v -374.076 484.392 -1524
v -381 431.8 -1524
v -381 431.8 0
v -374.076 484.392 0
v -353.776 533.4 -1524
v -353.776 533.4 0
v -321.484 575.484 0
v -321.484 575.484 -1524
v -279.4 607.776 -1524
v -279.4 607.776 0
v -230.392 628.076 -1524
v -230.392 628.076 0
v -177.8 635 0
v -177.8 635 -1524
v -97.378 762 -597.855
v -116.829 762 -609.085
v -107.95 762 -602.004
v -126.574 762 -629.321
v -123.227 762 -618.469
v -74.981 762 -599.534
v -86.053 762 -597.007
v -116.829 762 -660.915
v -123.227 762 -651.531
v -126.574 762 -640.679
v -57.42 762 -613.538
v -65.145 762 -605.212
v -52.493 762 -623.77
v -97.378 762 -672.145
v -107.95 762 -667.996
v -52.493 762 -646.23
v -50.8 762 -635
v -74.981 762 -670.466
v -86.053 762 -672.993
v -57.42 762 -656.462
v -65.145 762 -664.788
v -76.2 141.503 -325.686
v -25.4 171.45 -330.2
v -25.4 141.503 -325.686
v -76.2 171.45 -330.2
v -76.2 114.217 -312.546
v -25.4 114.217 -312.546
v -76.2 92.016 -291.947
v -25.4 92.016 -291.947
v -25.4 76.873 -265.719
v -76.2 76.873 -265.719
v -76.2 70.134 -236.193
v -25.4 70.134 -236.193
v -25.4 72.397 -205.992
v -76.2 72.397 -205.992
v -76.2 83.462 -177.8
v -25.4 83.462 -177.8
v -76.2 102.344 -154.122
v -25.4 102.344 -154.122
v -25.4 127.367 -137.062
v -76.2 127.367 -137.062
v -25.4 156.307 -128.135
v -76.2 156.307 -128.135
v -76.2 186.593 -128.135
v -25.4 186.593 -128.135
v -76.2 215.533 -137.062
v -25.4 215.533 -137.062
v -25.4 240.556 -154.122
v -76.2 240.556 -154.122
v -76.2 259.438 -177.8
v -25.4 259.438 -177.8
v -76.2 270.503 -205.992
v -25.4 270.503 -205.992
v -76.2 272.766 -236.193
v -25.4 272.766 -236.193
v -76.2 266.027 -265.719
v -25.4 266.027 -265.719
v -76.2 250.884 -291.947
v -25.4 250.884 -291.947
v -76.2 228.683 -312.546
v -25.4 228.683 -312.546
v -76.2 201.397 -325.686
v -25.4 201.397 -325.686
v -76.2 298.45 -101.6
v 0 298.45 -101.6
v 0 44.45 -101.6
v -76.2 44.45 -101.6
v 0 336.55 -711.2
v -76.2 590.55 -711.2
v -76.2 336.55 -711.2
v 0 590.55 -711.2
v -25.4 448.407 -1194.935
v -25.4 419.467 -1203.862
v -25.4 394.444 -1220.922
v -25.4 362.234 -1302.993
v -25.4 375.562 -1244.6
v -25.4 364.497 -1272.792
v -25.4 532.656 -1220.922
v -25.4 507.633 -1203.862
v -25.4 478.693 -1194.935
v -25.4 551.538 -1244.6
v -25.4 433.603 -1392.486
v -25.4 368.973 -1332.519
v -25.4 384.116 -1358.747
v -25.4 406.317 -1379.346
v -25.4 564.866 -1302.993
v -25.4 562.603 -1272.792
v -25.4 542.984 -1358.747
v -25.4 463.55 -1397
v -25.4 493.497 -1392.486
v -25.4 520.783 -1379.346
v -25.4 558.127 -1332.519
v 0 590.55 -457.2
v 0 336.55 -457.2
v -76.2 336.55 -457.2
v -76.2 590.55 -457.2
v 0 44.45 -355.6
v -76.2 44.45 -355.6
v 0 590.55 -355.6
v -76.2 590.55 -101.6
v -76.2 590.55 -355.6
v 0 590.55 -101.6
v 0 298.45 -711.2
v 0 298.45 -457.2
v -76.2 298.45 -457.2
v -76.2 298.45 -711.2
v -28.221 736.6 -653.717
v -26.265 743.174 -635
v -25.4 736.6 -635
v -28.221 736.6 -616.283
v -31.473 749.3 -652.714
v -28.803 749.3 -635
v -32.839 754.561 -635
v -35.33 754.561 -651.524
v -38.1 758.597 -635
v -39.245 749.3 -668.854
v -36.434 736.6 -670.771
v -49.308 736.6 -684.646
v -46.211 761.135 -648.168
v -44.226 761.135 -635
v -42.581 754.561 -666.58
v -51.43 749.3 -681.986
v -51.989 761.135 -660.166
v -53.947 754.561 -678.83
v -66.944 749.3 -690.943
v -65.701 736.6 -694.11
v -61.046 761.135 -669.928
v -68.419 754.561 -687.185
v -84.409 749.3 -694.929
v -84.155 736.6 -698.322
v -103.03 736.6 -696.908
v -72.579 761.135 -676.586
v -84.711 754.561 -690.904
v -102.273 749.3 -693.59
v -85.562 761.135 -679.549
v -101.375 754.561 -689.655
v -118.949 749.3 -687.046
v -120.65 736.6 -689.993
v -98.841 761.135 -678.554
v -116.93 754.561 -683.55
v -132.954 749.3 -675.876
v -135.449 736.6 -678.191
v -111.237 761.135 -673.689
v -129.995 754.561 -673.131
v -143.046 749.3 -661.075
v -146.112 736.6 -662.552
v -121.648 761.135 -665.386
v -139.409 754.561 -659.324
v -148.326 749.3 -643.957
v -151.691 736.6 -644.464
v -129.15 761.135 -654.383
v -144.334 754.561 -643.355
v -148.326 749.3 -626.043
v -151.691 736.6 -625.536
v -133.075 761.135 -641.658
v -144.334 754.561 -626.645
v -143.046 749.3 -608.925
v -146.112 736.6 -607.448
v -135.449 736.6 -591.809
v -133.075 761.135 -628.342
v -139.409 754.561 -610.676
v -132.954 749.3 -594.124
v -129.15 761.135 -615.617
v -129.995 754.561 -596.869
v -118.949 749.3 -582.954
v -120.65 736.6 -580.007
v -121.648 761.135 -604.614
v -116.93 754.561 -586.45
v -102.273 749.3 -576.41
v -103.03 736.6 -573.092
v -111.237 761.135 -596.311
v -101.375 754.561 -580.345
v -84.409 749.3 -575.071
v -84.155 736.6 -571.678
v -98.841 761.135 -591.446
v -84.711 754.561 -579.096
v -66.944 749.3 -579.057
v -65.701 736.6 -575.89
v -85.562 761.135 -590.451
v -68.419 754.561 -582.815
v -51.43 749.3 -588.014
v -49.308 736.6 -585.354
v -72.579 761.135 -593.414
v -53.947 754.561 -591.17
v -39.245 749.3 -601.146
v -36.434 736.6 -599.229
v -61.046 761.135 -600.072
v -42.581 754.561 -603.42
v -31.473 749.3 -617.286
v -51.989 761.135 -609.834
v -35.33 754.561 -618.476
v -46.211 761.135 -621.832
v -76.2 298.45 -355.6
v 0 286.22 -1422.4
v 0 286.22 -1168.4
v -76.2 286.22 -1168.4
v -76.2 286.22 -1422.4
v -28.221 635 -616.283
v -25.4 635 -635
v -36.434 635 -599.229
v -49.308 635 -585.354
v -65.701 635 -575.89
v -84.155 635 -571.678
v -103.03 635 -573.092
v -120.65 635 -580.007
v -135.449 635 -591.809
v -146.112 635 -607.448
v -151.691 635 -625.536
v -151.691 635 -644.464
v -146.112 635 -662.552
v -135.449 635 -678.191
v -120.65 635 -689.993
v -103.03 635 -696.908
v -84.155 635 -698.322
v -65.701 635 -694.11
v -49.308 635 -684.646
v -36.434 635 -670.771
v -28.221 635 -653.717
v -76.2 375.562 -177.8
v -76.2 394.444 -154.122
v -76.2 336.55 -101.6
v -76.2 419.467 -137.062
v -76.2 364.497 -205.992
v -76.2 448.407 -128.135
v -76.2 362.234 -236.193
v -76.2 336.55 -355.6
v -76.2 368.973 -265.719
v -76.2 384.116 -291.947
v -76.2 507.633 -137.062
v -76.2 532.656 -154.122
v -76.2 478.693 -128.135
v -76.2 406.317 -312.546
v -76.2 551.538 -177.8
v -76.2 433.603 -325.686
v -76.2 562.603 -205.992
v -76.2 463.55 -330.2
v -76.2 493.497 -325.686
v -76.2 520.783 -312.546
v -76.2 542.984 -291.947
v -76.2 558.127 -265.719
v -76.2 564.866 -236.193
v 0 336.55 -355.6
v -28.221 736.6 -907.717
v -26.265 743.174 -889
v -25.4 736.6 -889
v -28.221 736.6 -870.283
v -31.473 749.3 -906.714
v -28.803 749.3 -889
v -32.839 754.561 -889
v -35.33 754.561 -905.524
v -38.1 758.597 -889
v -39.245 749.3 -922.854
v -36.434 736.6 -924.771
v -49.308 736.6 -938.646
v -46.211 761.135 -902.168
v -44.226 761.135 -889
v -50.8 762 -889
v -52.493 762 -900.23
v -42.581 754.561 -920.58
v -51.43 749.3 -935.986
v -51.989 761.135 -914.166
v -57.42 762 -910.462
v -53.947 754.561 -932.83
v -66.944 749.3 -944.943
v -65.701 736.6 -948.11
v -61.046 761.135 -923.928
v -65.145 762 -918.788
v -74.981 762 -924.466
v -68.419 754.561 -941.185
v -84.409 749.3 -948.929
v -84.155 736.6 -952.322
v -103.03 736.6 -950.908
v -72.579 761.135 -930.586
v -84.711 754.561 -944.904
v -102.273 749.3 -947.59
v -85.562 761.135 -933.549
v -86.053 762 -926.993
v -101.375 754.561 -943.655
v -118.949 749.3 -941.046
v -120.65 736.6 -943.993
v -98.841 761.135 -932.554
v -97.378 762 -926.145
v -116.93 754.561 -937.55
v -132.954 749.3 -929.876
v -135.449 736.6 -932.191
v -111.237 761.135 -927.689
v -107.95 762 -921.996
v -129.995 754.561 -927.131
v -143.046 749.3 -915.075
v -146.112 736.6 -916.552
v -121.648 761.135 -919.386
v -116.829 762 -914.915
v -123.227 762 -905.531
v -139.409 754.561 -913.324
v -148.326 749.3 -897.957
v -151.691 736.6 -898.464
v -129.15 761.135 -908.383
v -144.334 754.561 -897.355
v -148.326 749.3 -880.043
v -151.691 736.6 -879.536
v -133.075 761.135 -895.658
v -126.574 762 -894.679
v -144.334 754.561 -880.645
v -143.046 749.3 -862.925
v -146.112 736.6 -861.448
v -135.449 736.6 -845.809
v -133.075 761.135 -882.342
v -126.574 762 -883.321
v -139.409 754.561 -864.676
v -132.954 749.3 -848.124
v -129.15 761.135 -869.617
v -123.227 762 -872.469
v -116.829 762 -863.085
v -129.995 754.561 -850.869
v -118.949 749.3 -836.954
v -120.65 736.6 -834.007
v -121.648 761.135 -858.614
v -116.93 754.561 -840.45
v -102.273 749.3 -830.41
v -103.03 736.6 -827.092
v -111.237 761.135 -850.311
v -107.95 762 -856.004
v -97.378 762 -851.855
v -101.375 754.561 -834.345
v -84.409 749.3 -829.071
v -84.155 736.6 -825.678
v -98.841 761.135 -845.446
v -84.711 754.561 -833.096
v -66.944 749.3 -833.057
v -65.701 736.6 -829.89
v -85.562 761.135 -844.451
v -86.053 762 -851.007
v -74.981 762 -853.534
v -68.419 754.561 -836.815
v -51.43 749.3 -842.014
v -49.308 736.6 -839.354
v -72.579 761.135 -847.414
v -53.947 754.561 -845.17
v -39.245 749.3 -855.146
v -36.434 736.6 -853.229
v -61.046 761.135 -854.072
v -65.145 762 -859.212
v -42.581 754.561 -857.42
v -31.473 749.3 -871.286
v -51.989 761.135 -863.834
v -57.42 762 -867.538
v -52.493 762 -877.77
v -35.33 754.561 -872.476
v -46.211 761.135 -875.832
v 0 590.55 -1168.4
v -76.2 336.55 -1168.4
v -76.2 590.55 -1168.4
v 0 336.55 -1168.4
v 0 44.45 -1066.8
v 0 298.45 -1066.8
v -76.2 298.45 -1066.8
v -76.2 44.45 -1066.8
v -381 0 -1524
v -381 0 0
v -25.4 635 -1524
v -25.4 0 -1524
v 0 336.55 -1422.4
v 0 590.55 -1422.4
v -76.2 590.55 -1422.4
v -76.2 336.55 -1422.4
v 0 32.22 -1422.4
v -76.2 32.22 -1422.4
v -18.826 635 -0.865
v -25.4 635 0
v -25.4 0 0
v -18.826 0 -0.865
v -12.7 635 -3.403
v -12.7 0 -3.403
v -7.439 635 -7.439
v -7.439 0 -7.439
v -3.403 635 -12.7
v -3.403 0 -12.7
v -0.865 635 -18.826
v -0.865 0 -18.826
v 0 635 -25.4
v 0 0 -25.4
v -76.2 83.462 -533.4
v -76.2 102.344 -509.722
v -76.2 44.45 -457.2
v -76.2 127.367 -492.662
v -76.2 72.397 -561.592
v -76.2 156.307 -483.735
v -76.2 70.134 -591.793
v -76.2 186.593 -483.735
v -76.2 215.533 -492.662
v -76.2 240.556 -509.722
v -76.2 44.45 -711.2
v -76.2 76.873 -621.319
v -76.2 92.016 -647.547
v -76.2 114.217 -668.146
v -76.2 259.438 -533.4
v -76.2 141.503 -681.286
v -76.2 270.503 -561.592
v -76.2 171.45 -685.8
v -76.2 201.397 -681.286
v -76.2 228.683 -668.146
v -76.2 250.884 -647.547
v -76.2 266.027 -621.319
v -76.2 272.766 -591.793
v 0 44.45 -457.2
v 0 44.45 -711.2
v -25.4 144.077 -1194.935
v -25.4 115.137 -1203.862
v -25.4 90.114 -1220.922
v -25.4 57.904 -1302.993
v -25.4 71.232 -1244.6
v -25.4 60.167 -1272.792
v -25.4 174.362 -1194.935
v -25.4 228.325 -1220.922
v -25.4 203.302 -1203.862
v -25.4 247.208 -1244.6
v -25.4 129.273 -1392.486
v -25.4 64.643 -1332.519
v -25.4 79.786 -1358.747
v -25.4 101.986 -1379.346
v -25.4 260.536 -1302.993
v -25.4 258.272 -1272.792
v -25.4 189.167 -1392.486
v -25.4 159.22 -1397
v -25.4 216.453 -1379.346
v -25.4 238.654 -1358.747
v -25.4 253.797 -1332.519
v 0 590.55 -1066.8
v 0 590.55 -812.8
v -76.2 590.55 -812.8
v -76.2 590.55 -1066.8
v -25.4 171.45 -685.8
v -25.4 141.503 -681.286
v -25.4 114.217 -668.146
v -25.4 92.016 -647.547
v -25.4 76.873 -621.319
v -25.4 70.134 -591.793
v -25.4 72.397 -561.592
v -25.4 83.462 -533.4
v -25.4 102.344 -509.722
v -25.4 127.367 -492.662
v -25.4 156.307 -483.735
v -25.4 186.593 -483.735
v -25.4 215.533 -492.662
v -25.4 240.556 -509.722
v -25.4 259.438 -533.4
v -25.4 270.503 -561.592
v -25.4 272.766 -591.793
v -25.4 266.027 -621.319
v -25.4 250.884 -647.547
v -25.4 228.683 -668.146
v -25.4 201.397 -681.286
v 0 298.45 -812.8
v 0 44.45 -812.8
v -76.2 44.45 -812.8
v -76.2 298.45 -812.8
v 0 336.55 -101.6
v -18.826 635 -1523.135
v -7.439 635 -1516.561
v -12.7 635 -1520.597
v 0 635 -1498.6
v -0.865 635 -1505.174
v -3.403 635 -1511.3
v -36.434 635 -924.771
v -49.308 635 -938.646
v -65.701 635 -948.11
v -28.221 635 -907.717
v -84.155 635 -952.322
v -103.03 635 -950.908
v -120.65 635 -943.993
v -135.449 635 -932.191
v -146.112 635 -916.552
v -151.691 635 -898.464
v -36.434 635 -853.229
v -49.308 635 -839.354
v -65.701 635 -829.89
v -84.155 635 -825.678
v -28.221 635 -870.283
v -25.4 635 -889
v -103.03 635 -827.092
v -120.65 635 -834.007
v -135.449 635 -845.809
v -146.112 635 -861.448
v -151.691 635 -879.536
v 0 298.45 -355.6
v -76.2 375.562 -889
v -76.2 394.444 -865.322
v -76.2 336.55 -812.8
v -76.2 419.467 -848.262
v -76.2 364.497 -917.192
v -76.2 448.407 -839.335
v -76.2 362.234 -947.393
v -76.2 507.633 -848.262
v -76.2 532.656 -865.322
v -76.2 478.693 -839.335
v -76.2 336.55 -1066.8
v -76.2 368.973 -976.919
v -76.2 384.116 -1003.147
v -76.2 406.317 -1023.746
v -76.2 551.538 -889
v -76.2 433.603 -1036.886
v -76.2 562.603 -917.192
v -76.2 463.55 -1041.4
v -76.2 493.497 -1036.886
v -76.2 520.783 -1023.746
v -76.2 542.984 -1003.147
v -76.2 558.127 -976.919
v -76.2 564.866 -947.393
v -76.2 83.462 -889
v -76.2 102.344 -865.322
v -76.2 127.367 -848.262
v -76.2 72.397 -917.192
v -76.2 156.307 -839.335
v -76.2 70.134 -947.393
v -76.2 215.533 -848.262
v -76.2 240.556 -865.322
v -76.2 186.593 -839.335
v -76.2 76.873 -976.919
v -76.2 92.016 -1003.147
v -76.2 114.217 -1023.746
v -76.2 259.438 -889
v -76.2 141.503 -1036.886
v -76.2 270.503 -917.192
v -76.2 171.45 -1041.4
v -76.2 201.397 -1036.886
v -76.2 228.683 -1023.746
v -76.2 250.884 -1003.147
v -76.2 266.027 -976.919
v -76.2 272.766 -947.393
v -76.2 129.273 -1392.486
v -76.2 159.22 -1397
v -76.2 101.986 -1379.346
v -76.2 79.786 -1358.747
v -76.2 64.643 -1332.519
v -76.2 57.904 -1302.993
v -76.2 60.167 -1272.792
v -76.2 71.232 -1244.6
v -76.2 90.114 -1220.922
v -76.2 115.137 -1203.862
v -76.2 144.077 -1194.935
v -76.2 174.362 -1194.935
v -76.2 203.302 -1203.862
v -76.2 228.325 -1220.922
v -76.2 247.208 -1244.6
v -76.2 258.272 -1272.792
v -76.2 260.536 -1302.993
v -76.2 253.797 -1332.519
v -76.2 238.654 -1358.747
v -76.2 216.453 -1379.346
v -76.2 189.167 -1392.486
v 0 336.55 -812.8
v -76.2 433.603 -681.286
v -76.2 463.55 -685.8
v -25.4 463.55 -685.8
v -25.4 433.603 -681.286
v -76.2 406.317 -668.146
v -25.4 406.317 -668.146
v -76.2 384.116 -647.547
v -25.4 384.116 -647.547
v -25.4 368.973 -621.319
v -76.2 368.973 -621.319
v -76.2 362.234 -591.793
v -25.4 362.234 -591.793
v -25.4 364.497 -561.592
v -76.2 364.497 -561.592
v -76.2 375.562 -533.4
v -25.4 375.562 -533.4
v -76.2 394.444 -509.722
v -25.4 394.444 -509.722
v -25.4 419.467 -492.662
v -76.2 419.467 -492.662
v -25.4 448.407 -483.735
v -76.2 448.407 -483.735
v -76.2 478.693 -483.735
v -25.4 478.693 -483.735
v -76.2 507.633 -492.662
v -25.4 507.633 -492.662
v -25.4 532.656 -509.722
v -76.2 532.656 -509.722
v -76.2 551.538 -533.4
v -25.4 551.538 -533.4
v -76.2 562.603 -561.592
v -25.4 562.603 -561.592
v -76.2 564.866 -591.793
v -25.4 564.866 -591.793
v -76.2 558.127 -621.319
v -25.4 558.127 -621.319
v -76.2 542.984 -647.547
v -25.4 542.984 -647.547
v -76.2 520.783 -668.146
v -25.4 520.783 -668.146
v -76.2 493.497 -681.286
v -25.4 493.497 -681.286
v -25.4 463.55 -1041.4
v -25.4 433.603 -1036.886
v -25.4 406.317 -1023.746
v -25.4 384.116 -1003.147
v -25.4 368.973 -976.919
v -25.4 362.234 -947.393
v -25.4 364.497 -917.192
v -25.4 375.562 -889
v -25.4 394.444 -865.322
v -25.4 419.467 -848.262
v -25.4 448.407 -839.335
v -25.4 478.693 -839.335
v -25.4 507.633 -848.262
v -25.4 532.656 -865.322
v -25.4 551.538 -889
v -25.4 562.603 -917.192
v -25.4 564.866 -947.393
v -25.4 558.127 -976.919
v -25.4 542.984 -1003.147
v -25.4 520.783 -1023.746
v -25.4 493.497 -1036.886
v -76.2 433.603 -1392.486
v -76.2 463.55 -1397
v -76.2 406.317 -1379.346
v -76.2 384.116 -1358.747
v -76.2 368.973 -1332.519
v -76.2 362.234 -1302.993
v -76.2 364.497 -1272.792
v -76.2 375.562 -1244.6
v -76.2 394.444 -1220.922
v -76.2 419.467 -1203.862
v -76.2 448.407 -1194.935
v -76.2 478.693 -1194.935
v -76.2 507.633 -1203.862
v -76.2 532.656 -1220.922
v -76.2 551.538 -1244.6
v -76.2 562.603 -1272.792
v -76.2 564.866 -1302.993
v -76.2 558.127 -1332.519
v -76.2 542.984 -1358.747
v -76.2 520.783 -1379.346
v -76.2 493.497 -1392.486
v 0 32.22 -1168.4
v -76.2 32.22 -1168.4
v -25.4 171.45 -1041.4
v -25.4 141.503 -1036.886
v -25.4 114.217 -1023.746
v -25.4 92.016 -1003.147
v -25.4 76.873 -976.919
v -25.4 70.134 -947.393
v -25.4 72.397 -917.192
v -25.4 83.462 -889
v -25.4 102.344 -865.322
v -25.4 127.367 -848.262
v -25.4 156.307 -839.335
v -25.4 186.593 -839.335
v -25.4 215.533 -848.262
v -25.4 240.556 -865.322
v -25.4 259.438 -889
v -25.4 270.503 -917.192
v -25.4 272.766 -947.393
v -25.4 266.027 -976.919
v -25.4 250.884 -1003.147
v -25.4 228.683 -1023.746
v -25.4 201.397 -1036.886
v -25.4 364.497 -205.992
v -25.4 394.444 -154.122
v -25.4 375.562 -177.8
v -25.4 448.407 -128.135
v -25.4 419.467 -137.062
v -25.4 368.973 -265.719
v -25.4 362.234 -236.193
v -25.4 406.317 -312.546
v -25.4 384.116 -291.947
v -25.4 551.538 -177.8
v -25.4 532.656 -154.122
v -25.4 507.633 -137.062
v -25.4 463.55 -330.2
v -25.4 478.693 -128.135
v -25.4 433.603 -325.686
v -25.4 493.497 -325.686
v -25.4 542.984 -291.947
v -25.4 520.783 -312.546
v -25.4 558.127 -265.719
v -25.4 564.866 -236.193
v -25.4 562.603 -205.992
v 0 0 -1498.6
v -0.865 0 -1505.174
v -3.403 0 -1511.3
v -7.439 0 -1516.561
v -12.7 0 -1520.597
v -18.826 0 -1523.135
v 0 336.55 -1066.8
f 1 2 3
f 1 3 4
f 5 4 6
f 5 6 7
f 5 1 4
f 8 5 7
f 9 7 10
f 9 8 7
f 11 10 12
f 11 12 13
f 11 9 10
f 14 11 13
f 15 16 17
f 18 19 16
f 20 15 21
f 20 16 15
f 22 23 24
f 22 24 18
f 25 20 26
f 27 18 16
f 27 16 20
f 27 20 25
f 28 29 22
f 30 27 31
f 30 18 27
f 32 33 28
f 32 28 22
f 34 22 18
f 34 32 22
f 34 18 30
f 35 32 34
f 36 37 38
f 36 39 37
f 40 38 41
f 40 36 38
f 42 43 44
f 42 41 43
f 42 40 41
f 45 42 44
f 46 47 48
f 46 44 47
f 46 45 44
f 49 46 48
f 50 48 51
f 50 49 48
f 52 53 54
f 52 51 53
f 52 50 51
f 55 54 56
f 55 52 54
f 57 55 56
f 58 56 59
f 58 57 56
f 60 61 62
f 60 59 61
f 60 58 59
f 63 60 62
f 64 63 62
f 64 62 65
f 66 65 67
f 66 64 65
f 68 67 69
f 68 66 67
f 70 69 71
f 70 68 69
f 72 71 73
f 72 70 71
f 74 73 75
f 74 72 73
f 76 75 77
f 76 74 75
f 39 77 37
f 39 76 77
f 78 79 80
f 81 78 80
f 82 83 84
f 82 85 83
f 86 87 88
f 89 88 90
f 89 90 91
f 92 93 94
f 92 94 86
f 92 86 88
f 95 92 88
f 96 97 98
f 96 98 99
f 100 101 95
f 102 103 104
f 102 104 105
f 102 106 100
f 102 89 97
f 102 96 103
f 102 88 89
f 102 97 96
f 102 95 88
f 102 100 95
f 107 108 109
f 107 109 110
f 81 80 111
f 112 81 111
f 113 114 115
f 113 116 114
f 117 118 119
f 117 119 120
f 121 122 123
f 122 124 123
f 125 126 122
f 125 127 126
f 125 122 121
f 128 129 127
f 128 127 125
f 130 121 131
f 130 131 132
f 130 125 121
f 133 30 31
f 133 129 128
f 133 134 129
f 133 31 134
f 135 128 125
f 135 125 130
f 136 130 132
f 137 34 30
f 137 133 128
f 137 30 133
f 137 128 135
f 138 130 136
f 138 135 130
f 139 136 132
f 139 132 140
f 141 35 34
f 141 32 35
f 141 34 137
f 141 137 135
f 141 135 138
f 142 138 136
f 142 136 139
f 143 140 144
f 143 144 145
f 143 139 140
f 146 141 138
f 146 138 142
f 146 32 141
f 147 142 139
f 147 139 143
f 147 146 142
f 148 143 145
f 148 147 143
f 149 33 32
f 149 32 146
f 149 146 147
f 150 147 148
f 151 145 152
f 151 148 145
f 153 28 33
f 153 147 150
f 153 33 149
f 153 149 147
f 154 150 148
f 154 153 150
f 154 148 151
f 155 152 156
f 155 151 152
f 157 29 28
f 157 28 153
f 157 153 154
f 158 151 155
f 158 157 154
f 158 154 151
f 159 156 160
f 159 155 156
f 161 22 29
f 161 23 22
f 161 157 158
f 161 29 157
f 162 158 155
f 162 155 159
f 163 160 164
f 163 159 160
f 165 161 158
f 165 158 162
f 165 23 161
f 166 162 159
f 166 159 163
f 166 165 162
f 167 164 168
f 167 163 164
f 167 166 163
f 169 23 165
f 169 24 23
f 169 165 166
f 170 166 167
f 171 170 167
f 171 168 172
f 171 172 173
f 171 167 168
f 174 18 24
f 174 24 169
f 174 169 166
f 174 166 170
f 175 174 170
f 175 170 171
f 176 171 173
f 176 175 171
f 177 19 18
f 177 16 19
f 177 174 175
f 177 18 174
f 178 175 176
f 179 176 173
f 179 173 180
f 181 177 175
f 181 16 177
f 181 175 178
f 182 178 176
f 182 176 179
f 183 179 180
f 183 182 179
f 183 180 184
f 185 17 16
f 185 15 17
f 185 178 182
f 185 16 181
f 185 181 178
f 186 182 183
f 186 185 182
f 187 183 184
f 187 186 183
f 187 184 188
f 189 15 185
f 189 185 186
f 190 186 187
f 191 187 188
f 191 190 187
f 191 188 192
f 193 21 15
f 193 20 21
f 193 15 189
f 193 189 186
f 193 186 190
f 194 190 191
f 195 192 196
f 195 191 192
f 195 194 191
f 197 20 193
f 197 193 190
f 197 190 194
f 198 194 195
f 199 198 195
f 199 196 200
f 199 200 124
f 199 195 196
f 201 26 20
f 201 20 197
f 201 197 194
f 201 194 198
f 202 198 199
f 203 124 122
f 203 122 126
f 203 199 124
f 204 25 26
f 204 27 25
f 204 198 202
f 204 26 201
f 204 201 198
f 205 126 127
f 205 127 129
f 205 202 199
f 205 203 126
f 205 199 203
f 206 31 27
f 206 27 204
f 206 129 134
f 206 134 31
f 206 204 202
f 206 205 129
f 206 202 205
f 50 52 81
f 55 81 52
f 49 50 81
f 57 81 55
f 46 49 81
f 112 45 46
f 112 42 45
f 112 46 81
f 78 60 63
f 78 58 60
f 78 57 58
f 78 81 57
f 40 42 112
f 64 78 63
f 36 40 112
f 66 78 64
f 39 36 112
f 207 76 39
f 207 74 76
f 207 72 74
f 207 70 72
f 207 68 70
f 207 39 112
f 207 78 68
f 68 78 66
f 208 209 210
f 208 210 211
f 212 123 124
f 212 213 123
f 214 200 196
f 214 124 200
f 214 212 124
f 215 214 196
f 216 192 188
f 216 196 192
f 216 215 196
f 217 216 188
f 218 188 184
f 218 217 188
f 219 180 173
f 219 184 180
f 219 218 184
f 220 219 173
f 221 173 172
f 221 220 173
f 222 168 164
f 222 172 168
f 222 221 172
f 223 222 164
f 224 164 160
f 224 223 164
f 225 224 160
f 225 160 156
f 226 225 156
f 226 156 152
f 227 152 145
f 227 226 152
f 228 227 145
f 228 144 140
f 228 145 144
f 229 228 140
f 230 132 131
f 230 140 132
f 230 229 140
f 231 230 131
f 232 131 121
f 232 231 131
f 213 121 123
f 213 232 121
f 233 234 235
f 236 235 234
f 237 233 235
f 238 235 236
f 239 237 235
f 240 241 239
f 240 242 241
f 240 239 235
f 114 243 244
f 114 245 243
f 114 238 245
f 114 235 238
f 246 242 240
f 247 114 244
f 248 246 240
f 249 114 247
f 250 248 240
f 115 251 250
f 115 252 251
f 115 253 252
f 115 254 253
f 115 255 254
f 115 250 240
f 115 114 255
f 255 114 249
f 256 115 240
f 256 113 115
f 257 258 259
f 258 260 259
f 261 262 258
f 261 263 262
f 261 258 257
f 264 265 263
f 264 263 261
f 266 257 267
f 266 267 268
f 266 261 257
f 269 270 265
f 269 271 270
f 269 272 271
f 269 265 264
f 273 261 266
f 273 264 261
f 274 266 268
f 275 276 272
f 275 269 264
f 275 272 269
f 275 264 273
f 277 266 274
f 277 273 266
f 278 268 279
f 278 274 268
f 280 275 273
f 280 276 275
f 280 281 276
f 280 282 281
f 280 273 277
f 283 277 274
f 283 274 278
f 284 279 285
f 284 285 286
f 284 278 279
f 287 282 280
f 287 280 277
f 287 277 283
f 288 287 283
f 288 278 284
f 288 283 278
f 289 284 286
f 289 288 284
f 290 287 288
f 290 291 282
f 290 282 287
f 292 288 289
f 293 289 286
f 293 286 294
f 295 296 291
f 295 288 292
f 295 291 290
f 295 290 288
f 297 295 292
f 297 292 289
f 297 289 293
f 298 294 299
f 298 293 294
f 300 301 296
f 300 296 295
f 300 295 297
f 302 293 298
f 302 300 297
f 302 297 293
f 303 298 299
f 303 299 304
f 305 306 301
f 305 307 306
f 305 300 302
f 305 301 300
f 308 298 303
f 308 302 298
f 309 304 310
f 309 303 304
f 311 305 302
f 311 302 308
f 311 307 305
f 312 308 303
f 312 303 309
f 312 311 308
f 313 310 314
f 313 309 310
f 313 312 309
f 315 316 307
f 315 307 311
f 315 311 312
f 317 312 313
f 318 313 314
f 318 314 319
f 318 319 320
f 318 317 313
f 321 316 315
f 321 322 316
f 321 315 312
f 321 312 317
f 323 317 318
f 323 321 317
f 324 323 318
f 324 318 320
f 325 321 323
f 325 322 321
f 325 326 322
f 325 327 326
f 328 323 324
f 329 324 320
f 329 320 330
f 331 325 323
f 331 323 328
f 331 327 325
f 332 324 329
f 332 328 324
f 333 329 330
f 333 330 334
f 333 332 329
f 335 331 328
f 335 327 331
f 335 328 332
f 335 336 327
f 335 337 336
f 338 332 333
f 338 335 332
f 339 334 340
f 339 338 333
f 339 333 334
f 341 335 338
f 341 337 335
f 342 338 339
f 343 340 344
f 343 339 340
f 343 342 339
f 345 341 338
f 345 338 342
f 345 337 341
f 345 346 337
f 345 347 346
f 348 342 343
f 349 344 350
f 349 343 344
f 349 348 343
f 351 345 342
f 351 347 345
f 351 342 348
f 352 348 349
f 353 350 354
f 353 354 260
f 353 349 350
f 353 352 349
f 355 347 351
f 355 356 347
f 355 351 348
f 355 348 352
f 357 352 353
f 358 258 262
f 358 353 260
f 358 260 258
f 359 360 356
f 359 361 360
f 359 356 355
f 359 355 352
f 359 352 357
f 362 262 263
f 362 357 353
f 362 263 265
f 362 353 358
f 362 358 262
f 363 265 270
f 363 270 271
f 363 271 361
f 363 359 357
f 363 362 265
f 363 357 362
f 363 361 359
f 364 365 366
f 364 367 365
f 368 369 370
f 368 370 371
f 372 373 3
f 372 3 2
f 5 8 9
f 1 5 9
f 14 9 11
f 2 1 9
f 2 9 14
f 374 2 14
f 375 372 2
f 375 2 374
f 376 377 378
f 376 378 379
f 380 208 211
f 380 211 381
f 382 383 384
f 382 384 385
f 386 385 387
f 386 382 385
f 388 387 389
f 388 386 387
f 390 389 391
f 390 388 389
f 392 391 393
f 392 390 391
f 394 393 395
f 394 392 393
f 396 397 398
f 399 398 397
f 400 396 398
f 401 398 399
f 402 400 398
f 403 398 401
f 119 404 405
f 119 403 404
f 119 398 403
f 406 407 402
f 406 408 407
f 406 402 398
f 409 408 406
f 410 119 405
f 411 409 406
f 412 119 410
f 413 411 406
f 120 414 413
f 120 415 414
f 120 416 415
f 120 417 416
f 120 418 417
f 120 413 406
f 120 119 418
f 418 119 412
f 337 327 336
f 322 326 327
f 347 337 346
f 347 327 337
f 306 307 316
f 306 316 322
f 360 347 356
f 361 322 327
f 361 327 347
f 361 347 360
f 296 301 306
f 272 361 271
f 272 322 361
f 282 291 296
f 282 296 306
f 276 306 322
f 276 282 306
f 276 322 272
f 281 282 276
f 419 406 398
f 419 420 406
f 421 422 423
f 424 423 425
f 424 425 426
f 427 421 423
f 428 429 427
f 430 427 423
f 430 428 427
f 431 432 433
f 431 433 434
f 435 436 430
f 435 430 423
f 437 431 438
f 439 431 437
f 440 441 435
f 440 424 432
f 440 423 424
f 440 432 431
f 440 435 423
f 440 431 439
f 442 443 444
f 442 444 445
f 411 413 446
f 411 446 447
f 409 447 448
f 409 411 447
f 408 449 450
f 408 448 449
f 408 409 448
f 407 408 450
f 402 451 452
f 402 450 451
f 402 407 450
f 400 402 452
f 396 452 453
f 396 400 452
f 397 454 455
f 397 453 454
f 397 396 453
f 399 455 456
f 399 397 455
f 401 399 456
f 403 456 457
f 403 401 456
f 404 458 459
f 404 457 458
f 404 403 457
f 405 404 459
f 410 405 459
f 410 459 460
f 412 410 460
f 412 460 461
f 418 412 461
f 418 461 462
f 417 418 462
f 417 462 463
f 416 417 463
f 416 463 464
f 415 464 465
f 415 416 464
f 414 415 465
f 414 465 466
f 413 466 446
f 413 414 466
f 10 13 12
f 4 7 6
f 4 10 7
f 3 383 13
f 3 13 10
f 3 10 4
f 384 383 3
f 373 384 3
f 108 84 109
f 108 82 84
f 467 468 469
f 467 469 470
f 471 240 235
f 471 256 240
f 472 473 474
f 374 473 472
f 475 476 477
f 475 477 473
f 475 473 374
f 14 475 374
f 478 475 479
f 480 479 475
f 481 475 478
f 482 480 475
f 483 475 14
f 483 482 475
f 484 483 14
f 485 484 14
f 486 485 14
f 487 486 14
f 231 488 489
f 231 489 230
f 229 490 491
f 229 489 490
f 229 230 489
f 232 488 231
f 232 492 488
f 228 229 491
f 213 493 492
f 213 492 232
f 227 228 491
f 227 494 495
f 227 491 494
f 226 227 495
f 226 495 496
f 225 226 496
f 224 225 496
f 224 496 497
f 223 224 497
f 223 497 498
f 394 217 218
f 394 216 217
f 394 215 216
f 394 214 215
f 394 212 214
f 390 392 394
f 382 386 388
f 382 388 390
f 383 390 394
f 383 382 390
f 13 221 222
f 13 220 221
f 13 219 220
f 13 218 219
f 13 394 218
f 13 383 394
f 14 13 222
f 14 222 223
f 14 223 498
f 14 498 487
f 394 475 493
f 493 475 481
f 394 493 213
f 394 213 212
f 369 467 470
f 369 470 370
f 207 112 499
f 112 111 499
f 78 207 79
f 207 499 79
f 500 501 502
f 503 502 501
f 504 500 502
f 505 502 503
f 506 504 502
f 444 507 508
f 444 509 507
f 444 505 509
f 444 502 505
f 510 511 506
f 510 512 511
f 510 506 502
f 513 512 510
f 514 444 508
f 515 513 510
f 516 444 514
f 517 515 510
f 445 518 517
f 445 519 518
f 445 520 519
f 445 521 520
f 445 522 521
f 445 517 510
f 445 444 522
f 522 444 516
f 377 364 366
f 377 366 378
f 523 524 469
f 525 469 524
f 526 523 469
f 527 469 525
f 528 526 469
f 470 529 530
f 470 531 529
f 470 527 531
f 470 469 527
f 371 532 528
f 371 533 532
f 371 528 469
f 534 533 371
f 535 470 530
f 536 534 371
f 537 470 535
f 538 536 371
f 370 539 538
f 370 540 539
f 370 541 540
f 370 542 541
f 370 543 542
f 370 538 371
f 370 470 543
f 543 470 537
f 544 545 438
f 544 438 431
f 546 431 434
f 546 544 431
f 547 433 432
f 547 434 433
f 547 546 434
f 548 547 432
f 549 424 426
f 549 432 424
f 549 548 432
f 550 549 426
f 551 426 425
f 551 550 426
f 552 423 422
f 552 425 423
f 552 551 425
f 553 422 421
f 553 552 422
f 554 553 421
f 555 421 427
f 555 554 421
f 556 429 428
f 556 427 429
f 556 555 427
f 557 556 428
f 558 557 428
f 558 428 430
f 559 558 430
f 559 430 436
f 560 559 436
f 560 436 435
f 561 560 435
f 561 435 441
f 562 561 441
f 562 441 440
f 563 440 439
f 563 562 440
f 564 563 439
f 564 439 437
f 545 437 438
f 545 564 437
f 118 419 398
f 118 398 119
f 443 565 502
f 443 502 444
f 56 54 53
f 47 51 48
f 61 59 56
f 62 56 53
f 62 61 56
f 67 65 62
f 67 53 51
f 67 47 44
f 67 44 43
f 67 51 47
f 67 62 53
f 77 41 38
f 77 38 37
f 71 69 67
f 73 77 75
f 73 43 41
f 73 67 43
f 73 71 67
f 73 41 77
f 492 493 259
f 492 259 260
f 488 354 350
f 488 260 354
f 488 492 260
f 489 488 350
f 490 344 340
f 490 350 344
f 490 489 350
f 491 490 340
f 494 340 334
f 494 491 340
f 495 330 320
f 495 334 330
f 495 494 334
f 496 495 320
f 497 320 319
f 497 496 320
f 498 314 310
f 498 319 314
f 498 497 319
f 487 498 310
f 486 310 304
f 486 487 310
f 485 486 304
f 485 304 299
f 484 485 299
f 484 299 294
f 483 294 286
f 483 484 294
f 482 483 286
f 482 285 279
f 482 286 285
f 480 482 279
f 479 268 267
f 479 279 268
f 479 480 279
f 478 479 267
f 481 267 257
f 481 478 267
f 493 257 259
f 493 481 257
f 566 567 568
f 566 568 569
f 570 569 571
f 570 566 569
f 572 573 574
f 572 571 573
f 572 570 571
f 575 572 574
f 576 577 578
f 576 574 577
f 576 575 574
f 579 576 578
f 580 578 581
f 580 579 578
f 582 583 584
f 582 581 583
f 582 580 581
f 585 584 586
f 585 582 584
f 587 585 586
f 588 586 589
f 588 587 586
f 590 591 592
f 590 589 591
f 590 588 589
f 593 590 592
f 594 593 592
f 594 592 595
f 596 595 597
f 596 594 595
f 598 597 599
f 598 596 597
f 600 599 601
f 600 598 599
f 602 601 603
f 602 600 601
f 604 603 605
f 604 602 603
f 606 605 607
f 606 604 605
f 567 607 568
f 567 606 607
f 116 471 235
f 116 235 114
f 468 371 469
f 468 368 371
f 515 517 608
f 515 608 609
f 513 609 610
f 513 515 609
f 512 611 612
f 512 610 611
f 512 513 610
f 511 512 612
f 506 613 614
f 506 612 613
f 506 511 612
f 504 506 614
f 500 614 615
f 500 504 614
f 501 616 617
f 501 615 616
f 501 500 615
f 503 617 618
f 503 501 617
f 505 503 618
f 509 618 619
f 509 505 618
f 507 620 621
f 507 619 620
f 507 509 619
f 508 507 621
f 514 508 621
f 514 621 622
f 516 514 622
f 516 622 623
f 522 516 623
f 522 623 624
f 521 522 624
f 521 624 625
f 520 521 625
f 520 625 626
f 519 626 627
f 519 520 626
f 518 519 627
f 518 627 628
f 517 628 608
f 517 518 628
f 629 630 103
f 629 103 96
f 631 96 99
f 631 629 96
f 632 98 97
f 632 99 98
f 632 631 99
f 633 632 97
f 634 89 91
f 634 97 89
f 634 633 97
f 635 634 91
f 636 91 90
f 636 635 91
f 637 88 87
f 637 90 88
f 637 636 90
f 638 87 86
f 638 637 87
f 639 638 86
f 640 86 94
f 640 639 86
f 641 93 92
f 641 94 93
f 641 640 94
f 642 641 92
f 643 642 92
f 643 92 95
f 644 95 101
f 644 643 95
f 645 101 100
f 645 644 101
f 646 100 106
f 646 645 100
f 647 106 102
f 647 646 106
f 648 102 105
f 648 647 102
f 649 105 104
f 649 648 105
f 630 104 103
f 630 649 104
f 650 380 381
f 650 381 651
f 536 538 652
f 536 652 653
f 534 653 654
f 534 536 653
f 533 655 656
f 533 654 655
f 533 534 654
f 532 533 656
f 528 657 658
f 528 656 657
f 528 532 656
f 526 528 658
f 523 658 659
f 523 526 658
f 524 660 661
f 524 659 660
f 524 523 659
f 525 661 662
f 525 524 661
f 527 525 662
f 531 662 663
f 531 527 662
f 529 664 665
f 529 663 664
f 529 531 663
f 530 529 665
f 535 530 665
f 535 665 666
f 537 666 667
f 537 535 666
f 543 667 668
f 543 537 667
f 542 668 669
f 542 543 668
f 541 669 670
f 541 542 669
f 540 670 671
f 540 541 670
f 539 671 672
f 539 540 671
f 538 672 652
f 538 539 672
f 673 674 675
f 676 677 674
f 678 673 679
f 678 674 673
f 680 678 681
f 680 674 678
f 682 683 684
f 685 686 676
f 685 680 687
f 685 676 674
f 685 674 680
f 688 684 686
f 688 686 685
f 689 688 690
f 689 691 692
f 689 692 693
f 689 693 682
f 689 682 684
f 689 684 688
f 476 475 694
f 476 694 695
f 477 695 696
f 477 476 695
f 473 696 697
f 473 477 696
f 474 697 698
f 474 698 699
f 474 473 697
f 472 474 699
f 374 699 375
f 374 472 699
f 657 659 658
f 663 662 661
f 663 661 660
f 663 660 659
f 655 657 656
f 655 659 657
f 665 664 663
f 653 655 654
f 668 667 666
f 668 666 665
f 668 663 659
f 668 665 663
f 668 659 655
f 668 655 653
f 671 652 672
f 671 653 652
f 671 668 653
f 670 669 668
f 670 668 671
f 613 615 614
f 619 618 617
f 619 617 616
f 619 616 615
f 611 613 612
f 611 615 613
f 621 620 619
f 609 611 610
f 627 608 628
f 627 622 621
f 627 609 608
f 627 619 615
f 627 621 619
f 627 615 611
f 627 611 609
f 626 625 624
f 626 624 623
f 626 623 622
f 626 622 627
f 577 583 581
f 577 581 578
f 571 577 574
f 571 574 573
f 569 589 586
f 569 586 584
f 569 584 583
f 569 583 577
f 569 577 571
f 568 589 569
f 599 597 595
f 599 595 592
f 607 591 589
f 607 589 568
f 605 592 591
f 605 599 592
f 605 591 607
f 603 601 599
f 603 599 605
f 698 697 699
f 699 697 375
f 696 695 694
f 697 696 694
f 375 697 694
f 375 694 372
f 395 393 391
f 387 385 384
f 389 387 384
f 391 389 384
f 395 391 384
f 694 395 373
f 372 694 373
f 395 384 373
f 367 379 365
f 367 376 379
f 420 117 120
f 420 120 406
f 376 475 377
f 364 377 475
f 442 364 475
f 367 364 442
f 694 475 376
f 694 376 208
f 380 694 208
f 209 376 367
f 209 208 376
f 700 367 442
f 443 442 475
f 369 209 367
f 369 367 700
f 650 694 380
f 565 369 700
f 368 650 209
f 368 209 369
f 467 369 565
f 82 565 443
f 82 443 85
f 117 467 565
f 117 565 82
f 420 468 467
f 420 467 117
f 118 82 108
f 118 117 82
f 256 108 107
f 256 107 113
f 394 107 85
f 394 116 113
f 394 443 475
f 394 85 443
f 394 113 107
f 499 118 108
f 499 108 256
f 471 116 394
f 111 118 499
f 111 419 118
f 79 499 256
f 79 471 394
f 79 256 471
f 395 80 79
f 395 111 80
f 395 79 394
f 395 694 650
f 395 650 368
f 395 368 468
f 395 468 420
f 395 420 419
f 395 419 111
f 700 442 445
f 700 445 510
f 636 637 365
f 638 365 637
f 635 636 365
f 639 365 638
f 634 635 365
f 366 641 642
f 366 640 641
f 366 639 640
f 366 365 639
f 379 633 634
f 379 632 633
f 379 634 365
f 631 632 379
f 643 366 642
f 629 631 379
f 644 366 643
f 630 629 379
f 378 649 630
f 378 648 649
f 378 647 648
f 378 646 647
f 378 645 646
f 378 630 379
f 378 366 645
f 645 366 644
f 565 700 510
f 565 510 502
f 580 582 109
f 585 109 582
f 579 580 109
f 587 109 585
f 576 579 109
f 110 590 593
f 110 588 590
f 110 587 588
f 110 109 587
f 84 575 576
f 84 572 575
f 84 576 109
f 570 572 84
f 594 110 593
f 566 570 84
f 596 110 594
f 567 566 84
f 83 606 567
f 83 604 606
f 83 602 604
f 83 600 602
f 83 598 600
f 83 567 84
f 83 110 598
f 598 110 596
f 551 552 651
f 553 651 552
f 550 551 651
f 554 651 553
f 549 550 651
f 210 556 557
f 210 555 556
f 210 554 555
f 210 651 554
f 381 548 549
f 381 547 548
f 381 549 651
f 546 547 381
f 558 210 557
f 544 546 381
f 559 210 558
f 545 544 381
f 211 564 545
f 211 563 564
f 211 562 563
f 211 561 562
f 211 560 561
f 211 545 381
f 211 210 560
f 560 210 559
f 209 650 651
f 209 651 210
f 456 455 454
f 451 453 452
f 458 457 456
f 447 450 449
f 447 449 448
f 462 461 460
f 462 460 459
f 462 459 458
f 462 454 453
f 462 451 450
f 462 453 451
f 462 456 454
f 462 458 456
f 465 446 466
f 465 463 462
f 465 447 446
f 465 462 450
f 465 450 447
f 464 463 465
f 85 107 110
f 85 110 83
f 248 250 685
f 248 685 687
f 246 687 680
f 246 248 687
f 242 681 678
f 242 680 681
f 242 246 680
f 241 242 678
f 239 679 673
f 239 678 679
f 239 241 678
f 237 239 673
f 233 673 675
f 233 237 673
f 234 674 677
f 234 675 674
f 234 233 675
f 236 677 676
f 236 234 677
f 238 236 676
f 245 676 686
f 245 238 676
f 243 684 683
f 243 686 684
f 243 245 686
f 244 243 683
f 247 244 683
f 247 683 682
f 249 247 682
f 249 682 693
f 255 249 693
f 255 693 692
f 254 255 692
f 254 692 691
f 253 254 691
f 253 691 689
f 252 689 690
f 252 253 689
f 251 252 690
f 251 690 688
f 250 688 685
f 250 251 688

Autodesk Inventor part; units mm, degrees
ref_plane "YZ Plane" through (0, 0, 0) normal (1, 0, 0) x (0, 1, 0)
ref_plane "XZ Plane" through (0, 0, 0) normal (0, 1, 0) x (-1, 0, 0)
ref_plane "XY Plane" through (0, 0, 0) normal (0, 0, 1) x (1, 0, 0)
sketch "Sketch1" plane through (0, 0, 0) normal (0, 1, 0) x (-1, 0, 0)
  line L0 (0, 0) -> (381, 0)
  line L1 (381, 0) -> (381, -1524)
  line L2 (381, -1524) -> (0, -1524)
  line L3 (0, -1524) -> (0, 0)
  dimension "d0" = 381
  dimension "d1" = 1524
extrude "Extrusion1" add sketch "Sketch1" along normal blind 635
fillet "Fillet1" radius 203.2 1 edges at (-381, 635, -762)
sketch "Sketch2" plane through (0, 0, 0) normal (1, 0, 0) x (0, 0, -1)
  line L0 (101.6, 44.45) -> (355.6, 44.45)
  line L1 (355.6, 44.45) -> (355.6, 298.45)
  line L2 (355.6, 298.45) -> (101.6, 298.45)
  line L3 (101.6, 298.45) -> (101.6, 44.45)
  line L4 (0, 0) -> (1524, 0) projected
  line L5 (101.6, 590.55) -> (355.6, 590.55)
  line L6 (355.6, 590.55) -> (355.6, 336.55)
  line L7 (355.6, 336.55) -> (101.6, 336.55)
  line L8 (101.6, 336.55) -> (101.6, 590.55)
  line L9 (0, 0) -> (0, 635) projected
  line L10 (457.2, 590.55) -> (711.2, 590.55)
  line L11 (711.2, 590.55) -> (711.2, 336.55)
  line L12 (711.2, 336.55) -> (457.2, 336.55)
  line L13 (457.2, 336.55) -> (457.2, 590.55)
  line L14 (457.2, 298.45) -> (711.2, 298.45)
  line L15 (711.2, 298.45) -> (711.2, 44.45)
  line L16 (711.2, 44.45) -> (457.2, 44.45)
  line L17 (457.2, 44.45) -> (457.2, 298.45)
  line L18 (812.8, 590.55) -> (1066.8, 590.55)
  line L19 (1066.8, 590.55) -> (1066.8, 336.55)
  line L20 (1066.8, 336.55) -> (812.8, 336.55)
  line L21 (812.8, 336.55) -> (812.8, 590.55)
  line L22 (812.8, 298.45) -> (1066.8, 298.45)
  line L23 (1066.8, 298.45) -> (1066.8, 44.45)
  line L24 (1066.8, 44.45) -> (812.8, 44.45)
  line L25 (812.8, 44.45) -> (812.8, 298.45)
  line L26 (1168.4, 590.55) -> (1422.4, 590.55)
  line L27 (1422.4, 590.55) -> (1422.4, 336.55)
  line L28 (1422.4, 336.55) -> (1168.4, 336.55)
  line L29 (1168.4, 336.55) -> (1168.4, 590.55)
  line L30 (1168.4, 286.2198) -> (1422.4, 286.2198)
  line L31 (1422.4, 286.2198) -> (1422.4, 32.2198)
  line L32 (1422.4, 32.2198) -> (1168.4, 32.2198)
  line L33 (1168.4, 32.2198) -> (1168.4, 286.2198)
  dimension "d5" = 254
  dimension "d6" = 254
  dimension "d7" = 44.45
  dimension "d8" = 254
  dimension "d9" = 38.1
  dimension "d10" = 101.6
  dimension "d11" = 254
  dimension "d12" = 101.6
  dimension "d13" = 254
  dimension "d14" = 254
  dimension "d15" = 101.6
  dimension "d16" = 101.6
  dimension "d17" = 254
  dimension "d18" = 101.6
  dimension "d19" = 254
  dimension "d20" = 101.6
  dimension "d21" = 254
  dimension "d22" = 254
extrude "Extrusion2" cut sketch "Sketch2" against normal blind 76.2
sketch "Sketch3" plane through (-76.2, 0, 0) normal (1, 0, 0) x (0, 0, -1)
  line L0 (101.6, 336.55) -> (101.6, 590.55) projected
  line L1 (355.6, 336.55) -> (101.6, 336.55) projected
  line L2 (101.6, 590.55) -> (355.6, 590.55)
  line L3 (355.6, 590.55) -> (355.6, 336.55)
  line L4 (355.6, 336.55) -> (101.6, 336.55)
  line L5 (101.6, 336.55) -> (101.6, 590.55)
  circle A0 centre (228.6, 463.55) radius 101.6
  point P0 (0, 0)
  dimension "d25" = 127
  dimension "d26" = 127
  dimension "d27" = 203.2
sketch "Sketch5" plane through (-76.2, 0, 0) normal (1, 0, 0) x (0, 0, -1)
  line L0 (101.6, 298.45) -> (355.6, 298.45) projected
  line L1 (101.6, 298.45) -> (355.6, 298.45)
  line L2 (355.6, 298.45) -> (355.6, 44.45)
  line L3 (355.6, 44.45) -> (101.6, 44.45)
  line L4 (101.6, 44.45) -> (101.6, 298.45)
  circle A0 centre (228.6, 171.45) radius 101.6
  point P0 (0, 0)
  dimension "d28" = 203.2
sketch "Sketch6" plane through (-76.2, 0, 0) normal (1, 0, 0) x (0, 0, -1)
  line L0 (457.2, 336.55) -> (457.2, 590.55) projected
  line L1 (457.2, 590.55) -> (711.2, 590.55)
  line L2 (711.2, 590.55) -> (711.2, 336.55)
  line L3 (711.2, 336.55) -> (457.2, 336.55)
  line L4 (457.2, 336.55) -> (457.2, 590.55)
  circle A0 centre (584.2, 463.55) radius 101.6
  point P0 (0, 0)
  dimension "d29" = 203.2
sketch "Sketch7" plane through (-76.2, 0, 0) normal (1, 0, 0) x (0, 0, -1)
  line L0 (711.2, 44.45) -> (457.2, 44.45) projected
  line L1 (457.2, 44.45) -> (711.2, 44.45)
  line L2 (711.2, 44.45) -> (711.2, 298.45)
  line L3 (711.2, 298.45) -> (457.2, 298.45)
  line L4 (457.2, 298.45) -> (457.2, 44.45)
  circle A0 centre (584.2, 171.45) radius 101.6
  point P0 (0, 0)
  dimension "d30" = 203.2
sketch "Sketch8" plane through (-76.2, 0, 0) normal (1, 0, 0) x (0, 0, -1)
  line L0 (812.8, 336.55) -> (812.8, 590.55) projected
  line L1 (1066.8, 590.55) -> (1066.8, 336.55) projected
  line L2 (812.8, 590.55) -> (1066.8, 590.55)
  line L3 (1066.8, 590.55) -> (1066.8, 336.55)
  line L4 (1066.8, 336.55) -> (812.8, 336.55)
  line L5 (812.8, 336.55) -> (812.8, 590.55)
  circle A0 centre (939.8, 463.55) radius 101.6
  point P0 (0, 0)
  dimension "d31" = 203.2
sketch "Sketch9" plane through (-76.2, 0, 0) normal (1, 0, 0) x (0, 0, -1)
  line L0 (812.8, 298.45) -> (1066.8, 298.45)
  line L1 (1066.8, 298.45) -> (1066.8, 44.45)
  line L2 (1066.8, 44.45) -> (812.8, 44.45)
  line L3 (812.8, 44.45) -> (812.8, 298.45)
  circle A0 centre (939.8, 171.45) radius 101.6
  point P0 (0, 0)
  dimension "d32" = 203.2
sketch "Sketch10" plane through (-76.2, 0, 0) normal (1, 0, 0) x (0, 0, -1)
  line L0 (1168.4, 336.55) -> (1168.4, 590.55) projected
  line L1 (1422.4, 590.55) -> (1422.4, 336.55) projected
  line L2 (1168.4, 590.55) -> (1422.4, 590.55)
  line L3 (1422.4, 590.55) -> (1422.4, 336.55)
  line L4 (1422.4, 336.55) -> (1168.4, 336.55)
  line L5 (1168.4, 336.55) -> (1168.4, 590.55)
  circle A0 centre (1295.4, 463.55) radius 101.6
  point P0 (0, 0)
  dimension "d33" = 203.2
sketch "Sketch11" plane through (-76.2, 0, 0) normal (1, 0, 0) x (0, 0, -1)
  line L0 (1422.4, 286.2198) -> (1422.4, 32.2198) projected
  line L1 (1168.4, 286.2198) -> (1422.4, 286.2198)
  line L2 (1422.4, 286.2198) -> (1422.4, 32.2198)
  line L3 (1422.4, 32.2198) -> (1168.4, 32.2198)
  line L4 (1168.4, 32.2198) -> (1168.4, 286.2198)
  circle A0 centre (1295.4, 159.2198) radius 101.6
  point P0 (0, 0)
  dimension "d34" = 203.2
extrude "Extrusion3" add sketch "Sketch3" along normal blind 50.8 contours A0
extrude "Extrusion4" add sketch "Sketch6" along normal blind 50.8 contours A0
extrude "Extrusion5" add sketch "Sketch8" along normal blind 50.8 contours A0
extrude "Extrusion6" add sketch "Sketch10" along normal blind 50.8 contours A0
extrude "Extrusion7" add sketch "Sketch5" along normal blind 50.8 contours A0
extrude "Extrusion8" add sketch "Sketch7" along normal blind 50.8 contours A0
extrude "Extrusion9" add sketch "Sketch9" along normal blind 50.8 contours A0
extrude "Extrusion10" add sketch "Sketch11" along normal blind 50.8 contours A0
sketch "Sketch12" plane through (0, 635, 0) normal (0, 1, 0) x (1, 0, 0)
  circle A0 centre (-88.9, 635) radius 63.5
  line L0 (0, 0) -> (0, 1524) projected
  line L1 (-177.8, 0) -> (0, 0) projected
  circle A1 centre (-88.9, 889) radius 63.5
  line L2 (0, 1524) -> (-177.8, 1524) projected
  dimension "d51" = 127
  dimension "d52" = 88.9
  dimension "d53" = 635
  dimension "d54" = 127
  dimension "d55" = 88.9
  dimension "d56" = 635
extrude "Extrusion11" add sketch "Sketch12" along normal blind 127
fillet "Fillet2" radius 25.4 2 edges at (0, 317.5, 0) (-152.4, 762, -635)
fillet "Fillet3" radius 25.4 1 edges at (-152.4, 762, -889)
fillet "Fillet4" radius 25.4 1 edges at (0, 317.5, -1524)
properties part number "PTreasureChestFinal-ver1-1111-2021"
